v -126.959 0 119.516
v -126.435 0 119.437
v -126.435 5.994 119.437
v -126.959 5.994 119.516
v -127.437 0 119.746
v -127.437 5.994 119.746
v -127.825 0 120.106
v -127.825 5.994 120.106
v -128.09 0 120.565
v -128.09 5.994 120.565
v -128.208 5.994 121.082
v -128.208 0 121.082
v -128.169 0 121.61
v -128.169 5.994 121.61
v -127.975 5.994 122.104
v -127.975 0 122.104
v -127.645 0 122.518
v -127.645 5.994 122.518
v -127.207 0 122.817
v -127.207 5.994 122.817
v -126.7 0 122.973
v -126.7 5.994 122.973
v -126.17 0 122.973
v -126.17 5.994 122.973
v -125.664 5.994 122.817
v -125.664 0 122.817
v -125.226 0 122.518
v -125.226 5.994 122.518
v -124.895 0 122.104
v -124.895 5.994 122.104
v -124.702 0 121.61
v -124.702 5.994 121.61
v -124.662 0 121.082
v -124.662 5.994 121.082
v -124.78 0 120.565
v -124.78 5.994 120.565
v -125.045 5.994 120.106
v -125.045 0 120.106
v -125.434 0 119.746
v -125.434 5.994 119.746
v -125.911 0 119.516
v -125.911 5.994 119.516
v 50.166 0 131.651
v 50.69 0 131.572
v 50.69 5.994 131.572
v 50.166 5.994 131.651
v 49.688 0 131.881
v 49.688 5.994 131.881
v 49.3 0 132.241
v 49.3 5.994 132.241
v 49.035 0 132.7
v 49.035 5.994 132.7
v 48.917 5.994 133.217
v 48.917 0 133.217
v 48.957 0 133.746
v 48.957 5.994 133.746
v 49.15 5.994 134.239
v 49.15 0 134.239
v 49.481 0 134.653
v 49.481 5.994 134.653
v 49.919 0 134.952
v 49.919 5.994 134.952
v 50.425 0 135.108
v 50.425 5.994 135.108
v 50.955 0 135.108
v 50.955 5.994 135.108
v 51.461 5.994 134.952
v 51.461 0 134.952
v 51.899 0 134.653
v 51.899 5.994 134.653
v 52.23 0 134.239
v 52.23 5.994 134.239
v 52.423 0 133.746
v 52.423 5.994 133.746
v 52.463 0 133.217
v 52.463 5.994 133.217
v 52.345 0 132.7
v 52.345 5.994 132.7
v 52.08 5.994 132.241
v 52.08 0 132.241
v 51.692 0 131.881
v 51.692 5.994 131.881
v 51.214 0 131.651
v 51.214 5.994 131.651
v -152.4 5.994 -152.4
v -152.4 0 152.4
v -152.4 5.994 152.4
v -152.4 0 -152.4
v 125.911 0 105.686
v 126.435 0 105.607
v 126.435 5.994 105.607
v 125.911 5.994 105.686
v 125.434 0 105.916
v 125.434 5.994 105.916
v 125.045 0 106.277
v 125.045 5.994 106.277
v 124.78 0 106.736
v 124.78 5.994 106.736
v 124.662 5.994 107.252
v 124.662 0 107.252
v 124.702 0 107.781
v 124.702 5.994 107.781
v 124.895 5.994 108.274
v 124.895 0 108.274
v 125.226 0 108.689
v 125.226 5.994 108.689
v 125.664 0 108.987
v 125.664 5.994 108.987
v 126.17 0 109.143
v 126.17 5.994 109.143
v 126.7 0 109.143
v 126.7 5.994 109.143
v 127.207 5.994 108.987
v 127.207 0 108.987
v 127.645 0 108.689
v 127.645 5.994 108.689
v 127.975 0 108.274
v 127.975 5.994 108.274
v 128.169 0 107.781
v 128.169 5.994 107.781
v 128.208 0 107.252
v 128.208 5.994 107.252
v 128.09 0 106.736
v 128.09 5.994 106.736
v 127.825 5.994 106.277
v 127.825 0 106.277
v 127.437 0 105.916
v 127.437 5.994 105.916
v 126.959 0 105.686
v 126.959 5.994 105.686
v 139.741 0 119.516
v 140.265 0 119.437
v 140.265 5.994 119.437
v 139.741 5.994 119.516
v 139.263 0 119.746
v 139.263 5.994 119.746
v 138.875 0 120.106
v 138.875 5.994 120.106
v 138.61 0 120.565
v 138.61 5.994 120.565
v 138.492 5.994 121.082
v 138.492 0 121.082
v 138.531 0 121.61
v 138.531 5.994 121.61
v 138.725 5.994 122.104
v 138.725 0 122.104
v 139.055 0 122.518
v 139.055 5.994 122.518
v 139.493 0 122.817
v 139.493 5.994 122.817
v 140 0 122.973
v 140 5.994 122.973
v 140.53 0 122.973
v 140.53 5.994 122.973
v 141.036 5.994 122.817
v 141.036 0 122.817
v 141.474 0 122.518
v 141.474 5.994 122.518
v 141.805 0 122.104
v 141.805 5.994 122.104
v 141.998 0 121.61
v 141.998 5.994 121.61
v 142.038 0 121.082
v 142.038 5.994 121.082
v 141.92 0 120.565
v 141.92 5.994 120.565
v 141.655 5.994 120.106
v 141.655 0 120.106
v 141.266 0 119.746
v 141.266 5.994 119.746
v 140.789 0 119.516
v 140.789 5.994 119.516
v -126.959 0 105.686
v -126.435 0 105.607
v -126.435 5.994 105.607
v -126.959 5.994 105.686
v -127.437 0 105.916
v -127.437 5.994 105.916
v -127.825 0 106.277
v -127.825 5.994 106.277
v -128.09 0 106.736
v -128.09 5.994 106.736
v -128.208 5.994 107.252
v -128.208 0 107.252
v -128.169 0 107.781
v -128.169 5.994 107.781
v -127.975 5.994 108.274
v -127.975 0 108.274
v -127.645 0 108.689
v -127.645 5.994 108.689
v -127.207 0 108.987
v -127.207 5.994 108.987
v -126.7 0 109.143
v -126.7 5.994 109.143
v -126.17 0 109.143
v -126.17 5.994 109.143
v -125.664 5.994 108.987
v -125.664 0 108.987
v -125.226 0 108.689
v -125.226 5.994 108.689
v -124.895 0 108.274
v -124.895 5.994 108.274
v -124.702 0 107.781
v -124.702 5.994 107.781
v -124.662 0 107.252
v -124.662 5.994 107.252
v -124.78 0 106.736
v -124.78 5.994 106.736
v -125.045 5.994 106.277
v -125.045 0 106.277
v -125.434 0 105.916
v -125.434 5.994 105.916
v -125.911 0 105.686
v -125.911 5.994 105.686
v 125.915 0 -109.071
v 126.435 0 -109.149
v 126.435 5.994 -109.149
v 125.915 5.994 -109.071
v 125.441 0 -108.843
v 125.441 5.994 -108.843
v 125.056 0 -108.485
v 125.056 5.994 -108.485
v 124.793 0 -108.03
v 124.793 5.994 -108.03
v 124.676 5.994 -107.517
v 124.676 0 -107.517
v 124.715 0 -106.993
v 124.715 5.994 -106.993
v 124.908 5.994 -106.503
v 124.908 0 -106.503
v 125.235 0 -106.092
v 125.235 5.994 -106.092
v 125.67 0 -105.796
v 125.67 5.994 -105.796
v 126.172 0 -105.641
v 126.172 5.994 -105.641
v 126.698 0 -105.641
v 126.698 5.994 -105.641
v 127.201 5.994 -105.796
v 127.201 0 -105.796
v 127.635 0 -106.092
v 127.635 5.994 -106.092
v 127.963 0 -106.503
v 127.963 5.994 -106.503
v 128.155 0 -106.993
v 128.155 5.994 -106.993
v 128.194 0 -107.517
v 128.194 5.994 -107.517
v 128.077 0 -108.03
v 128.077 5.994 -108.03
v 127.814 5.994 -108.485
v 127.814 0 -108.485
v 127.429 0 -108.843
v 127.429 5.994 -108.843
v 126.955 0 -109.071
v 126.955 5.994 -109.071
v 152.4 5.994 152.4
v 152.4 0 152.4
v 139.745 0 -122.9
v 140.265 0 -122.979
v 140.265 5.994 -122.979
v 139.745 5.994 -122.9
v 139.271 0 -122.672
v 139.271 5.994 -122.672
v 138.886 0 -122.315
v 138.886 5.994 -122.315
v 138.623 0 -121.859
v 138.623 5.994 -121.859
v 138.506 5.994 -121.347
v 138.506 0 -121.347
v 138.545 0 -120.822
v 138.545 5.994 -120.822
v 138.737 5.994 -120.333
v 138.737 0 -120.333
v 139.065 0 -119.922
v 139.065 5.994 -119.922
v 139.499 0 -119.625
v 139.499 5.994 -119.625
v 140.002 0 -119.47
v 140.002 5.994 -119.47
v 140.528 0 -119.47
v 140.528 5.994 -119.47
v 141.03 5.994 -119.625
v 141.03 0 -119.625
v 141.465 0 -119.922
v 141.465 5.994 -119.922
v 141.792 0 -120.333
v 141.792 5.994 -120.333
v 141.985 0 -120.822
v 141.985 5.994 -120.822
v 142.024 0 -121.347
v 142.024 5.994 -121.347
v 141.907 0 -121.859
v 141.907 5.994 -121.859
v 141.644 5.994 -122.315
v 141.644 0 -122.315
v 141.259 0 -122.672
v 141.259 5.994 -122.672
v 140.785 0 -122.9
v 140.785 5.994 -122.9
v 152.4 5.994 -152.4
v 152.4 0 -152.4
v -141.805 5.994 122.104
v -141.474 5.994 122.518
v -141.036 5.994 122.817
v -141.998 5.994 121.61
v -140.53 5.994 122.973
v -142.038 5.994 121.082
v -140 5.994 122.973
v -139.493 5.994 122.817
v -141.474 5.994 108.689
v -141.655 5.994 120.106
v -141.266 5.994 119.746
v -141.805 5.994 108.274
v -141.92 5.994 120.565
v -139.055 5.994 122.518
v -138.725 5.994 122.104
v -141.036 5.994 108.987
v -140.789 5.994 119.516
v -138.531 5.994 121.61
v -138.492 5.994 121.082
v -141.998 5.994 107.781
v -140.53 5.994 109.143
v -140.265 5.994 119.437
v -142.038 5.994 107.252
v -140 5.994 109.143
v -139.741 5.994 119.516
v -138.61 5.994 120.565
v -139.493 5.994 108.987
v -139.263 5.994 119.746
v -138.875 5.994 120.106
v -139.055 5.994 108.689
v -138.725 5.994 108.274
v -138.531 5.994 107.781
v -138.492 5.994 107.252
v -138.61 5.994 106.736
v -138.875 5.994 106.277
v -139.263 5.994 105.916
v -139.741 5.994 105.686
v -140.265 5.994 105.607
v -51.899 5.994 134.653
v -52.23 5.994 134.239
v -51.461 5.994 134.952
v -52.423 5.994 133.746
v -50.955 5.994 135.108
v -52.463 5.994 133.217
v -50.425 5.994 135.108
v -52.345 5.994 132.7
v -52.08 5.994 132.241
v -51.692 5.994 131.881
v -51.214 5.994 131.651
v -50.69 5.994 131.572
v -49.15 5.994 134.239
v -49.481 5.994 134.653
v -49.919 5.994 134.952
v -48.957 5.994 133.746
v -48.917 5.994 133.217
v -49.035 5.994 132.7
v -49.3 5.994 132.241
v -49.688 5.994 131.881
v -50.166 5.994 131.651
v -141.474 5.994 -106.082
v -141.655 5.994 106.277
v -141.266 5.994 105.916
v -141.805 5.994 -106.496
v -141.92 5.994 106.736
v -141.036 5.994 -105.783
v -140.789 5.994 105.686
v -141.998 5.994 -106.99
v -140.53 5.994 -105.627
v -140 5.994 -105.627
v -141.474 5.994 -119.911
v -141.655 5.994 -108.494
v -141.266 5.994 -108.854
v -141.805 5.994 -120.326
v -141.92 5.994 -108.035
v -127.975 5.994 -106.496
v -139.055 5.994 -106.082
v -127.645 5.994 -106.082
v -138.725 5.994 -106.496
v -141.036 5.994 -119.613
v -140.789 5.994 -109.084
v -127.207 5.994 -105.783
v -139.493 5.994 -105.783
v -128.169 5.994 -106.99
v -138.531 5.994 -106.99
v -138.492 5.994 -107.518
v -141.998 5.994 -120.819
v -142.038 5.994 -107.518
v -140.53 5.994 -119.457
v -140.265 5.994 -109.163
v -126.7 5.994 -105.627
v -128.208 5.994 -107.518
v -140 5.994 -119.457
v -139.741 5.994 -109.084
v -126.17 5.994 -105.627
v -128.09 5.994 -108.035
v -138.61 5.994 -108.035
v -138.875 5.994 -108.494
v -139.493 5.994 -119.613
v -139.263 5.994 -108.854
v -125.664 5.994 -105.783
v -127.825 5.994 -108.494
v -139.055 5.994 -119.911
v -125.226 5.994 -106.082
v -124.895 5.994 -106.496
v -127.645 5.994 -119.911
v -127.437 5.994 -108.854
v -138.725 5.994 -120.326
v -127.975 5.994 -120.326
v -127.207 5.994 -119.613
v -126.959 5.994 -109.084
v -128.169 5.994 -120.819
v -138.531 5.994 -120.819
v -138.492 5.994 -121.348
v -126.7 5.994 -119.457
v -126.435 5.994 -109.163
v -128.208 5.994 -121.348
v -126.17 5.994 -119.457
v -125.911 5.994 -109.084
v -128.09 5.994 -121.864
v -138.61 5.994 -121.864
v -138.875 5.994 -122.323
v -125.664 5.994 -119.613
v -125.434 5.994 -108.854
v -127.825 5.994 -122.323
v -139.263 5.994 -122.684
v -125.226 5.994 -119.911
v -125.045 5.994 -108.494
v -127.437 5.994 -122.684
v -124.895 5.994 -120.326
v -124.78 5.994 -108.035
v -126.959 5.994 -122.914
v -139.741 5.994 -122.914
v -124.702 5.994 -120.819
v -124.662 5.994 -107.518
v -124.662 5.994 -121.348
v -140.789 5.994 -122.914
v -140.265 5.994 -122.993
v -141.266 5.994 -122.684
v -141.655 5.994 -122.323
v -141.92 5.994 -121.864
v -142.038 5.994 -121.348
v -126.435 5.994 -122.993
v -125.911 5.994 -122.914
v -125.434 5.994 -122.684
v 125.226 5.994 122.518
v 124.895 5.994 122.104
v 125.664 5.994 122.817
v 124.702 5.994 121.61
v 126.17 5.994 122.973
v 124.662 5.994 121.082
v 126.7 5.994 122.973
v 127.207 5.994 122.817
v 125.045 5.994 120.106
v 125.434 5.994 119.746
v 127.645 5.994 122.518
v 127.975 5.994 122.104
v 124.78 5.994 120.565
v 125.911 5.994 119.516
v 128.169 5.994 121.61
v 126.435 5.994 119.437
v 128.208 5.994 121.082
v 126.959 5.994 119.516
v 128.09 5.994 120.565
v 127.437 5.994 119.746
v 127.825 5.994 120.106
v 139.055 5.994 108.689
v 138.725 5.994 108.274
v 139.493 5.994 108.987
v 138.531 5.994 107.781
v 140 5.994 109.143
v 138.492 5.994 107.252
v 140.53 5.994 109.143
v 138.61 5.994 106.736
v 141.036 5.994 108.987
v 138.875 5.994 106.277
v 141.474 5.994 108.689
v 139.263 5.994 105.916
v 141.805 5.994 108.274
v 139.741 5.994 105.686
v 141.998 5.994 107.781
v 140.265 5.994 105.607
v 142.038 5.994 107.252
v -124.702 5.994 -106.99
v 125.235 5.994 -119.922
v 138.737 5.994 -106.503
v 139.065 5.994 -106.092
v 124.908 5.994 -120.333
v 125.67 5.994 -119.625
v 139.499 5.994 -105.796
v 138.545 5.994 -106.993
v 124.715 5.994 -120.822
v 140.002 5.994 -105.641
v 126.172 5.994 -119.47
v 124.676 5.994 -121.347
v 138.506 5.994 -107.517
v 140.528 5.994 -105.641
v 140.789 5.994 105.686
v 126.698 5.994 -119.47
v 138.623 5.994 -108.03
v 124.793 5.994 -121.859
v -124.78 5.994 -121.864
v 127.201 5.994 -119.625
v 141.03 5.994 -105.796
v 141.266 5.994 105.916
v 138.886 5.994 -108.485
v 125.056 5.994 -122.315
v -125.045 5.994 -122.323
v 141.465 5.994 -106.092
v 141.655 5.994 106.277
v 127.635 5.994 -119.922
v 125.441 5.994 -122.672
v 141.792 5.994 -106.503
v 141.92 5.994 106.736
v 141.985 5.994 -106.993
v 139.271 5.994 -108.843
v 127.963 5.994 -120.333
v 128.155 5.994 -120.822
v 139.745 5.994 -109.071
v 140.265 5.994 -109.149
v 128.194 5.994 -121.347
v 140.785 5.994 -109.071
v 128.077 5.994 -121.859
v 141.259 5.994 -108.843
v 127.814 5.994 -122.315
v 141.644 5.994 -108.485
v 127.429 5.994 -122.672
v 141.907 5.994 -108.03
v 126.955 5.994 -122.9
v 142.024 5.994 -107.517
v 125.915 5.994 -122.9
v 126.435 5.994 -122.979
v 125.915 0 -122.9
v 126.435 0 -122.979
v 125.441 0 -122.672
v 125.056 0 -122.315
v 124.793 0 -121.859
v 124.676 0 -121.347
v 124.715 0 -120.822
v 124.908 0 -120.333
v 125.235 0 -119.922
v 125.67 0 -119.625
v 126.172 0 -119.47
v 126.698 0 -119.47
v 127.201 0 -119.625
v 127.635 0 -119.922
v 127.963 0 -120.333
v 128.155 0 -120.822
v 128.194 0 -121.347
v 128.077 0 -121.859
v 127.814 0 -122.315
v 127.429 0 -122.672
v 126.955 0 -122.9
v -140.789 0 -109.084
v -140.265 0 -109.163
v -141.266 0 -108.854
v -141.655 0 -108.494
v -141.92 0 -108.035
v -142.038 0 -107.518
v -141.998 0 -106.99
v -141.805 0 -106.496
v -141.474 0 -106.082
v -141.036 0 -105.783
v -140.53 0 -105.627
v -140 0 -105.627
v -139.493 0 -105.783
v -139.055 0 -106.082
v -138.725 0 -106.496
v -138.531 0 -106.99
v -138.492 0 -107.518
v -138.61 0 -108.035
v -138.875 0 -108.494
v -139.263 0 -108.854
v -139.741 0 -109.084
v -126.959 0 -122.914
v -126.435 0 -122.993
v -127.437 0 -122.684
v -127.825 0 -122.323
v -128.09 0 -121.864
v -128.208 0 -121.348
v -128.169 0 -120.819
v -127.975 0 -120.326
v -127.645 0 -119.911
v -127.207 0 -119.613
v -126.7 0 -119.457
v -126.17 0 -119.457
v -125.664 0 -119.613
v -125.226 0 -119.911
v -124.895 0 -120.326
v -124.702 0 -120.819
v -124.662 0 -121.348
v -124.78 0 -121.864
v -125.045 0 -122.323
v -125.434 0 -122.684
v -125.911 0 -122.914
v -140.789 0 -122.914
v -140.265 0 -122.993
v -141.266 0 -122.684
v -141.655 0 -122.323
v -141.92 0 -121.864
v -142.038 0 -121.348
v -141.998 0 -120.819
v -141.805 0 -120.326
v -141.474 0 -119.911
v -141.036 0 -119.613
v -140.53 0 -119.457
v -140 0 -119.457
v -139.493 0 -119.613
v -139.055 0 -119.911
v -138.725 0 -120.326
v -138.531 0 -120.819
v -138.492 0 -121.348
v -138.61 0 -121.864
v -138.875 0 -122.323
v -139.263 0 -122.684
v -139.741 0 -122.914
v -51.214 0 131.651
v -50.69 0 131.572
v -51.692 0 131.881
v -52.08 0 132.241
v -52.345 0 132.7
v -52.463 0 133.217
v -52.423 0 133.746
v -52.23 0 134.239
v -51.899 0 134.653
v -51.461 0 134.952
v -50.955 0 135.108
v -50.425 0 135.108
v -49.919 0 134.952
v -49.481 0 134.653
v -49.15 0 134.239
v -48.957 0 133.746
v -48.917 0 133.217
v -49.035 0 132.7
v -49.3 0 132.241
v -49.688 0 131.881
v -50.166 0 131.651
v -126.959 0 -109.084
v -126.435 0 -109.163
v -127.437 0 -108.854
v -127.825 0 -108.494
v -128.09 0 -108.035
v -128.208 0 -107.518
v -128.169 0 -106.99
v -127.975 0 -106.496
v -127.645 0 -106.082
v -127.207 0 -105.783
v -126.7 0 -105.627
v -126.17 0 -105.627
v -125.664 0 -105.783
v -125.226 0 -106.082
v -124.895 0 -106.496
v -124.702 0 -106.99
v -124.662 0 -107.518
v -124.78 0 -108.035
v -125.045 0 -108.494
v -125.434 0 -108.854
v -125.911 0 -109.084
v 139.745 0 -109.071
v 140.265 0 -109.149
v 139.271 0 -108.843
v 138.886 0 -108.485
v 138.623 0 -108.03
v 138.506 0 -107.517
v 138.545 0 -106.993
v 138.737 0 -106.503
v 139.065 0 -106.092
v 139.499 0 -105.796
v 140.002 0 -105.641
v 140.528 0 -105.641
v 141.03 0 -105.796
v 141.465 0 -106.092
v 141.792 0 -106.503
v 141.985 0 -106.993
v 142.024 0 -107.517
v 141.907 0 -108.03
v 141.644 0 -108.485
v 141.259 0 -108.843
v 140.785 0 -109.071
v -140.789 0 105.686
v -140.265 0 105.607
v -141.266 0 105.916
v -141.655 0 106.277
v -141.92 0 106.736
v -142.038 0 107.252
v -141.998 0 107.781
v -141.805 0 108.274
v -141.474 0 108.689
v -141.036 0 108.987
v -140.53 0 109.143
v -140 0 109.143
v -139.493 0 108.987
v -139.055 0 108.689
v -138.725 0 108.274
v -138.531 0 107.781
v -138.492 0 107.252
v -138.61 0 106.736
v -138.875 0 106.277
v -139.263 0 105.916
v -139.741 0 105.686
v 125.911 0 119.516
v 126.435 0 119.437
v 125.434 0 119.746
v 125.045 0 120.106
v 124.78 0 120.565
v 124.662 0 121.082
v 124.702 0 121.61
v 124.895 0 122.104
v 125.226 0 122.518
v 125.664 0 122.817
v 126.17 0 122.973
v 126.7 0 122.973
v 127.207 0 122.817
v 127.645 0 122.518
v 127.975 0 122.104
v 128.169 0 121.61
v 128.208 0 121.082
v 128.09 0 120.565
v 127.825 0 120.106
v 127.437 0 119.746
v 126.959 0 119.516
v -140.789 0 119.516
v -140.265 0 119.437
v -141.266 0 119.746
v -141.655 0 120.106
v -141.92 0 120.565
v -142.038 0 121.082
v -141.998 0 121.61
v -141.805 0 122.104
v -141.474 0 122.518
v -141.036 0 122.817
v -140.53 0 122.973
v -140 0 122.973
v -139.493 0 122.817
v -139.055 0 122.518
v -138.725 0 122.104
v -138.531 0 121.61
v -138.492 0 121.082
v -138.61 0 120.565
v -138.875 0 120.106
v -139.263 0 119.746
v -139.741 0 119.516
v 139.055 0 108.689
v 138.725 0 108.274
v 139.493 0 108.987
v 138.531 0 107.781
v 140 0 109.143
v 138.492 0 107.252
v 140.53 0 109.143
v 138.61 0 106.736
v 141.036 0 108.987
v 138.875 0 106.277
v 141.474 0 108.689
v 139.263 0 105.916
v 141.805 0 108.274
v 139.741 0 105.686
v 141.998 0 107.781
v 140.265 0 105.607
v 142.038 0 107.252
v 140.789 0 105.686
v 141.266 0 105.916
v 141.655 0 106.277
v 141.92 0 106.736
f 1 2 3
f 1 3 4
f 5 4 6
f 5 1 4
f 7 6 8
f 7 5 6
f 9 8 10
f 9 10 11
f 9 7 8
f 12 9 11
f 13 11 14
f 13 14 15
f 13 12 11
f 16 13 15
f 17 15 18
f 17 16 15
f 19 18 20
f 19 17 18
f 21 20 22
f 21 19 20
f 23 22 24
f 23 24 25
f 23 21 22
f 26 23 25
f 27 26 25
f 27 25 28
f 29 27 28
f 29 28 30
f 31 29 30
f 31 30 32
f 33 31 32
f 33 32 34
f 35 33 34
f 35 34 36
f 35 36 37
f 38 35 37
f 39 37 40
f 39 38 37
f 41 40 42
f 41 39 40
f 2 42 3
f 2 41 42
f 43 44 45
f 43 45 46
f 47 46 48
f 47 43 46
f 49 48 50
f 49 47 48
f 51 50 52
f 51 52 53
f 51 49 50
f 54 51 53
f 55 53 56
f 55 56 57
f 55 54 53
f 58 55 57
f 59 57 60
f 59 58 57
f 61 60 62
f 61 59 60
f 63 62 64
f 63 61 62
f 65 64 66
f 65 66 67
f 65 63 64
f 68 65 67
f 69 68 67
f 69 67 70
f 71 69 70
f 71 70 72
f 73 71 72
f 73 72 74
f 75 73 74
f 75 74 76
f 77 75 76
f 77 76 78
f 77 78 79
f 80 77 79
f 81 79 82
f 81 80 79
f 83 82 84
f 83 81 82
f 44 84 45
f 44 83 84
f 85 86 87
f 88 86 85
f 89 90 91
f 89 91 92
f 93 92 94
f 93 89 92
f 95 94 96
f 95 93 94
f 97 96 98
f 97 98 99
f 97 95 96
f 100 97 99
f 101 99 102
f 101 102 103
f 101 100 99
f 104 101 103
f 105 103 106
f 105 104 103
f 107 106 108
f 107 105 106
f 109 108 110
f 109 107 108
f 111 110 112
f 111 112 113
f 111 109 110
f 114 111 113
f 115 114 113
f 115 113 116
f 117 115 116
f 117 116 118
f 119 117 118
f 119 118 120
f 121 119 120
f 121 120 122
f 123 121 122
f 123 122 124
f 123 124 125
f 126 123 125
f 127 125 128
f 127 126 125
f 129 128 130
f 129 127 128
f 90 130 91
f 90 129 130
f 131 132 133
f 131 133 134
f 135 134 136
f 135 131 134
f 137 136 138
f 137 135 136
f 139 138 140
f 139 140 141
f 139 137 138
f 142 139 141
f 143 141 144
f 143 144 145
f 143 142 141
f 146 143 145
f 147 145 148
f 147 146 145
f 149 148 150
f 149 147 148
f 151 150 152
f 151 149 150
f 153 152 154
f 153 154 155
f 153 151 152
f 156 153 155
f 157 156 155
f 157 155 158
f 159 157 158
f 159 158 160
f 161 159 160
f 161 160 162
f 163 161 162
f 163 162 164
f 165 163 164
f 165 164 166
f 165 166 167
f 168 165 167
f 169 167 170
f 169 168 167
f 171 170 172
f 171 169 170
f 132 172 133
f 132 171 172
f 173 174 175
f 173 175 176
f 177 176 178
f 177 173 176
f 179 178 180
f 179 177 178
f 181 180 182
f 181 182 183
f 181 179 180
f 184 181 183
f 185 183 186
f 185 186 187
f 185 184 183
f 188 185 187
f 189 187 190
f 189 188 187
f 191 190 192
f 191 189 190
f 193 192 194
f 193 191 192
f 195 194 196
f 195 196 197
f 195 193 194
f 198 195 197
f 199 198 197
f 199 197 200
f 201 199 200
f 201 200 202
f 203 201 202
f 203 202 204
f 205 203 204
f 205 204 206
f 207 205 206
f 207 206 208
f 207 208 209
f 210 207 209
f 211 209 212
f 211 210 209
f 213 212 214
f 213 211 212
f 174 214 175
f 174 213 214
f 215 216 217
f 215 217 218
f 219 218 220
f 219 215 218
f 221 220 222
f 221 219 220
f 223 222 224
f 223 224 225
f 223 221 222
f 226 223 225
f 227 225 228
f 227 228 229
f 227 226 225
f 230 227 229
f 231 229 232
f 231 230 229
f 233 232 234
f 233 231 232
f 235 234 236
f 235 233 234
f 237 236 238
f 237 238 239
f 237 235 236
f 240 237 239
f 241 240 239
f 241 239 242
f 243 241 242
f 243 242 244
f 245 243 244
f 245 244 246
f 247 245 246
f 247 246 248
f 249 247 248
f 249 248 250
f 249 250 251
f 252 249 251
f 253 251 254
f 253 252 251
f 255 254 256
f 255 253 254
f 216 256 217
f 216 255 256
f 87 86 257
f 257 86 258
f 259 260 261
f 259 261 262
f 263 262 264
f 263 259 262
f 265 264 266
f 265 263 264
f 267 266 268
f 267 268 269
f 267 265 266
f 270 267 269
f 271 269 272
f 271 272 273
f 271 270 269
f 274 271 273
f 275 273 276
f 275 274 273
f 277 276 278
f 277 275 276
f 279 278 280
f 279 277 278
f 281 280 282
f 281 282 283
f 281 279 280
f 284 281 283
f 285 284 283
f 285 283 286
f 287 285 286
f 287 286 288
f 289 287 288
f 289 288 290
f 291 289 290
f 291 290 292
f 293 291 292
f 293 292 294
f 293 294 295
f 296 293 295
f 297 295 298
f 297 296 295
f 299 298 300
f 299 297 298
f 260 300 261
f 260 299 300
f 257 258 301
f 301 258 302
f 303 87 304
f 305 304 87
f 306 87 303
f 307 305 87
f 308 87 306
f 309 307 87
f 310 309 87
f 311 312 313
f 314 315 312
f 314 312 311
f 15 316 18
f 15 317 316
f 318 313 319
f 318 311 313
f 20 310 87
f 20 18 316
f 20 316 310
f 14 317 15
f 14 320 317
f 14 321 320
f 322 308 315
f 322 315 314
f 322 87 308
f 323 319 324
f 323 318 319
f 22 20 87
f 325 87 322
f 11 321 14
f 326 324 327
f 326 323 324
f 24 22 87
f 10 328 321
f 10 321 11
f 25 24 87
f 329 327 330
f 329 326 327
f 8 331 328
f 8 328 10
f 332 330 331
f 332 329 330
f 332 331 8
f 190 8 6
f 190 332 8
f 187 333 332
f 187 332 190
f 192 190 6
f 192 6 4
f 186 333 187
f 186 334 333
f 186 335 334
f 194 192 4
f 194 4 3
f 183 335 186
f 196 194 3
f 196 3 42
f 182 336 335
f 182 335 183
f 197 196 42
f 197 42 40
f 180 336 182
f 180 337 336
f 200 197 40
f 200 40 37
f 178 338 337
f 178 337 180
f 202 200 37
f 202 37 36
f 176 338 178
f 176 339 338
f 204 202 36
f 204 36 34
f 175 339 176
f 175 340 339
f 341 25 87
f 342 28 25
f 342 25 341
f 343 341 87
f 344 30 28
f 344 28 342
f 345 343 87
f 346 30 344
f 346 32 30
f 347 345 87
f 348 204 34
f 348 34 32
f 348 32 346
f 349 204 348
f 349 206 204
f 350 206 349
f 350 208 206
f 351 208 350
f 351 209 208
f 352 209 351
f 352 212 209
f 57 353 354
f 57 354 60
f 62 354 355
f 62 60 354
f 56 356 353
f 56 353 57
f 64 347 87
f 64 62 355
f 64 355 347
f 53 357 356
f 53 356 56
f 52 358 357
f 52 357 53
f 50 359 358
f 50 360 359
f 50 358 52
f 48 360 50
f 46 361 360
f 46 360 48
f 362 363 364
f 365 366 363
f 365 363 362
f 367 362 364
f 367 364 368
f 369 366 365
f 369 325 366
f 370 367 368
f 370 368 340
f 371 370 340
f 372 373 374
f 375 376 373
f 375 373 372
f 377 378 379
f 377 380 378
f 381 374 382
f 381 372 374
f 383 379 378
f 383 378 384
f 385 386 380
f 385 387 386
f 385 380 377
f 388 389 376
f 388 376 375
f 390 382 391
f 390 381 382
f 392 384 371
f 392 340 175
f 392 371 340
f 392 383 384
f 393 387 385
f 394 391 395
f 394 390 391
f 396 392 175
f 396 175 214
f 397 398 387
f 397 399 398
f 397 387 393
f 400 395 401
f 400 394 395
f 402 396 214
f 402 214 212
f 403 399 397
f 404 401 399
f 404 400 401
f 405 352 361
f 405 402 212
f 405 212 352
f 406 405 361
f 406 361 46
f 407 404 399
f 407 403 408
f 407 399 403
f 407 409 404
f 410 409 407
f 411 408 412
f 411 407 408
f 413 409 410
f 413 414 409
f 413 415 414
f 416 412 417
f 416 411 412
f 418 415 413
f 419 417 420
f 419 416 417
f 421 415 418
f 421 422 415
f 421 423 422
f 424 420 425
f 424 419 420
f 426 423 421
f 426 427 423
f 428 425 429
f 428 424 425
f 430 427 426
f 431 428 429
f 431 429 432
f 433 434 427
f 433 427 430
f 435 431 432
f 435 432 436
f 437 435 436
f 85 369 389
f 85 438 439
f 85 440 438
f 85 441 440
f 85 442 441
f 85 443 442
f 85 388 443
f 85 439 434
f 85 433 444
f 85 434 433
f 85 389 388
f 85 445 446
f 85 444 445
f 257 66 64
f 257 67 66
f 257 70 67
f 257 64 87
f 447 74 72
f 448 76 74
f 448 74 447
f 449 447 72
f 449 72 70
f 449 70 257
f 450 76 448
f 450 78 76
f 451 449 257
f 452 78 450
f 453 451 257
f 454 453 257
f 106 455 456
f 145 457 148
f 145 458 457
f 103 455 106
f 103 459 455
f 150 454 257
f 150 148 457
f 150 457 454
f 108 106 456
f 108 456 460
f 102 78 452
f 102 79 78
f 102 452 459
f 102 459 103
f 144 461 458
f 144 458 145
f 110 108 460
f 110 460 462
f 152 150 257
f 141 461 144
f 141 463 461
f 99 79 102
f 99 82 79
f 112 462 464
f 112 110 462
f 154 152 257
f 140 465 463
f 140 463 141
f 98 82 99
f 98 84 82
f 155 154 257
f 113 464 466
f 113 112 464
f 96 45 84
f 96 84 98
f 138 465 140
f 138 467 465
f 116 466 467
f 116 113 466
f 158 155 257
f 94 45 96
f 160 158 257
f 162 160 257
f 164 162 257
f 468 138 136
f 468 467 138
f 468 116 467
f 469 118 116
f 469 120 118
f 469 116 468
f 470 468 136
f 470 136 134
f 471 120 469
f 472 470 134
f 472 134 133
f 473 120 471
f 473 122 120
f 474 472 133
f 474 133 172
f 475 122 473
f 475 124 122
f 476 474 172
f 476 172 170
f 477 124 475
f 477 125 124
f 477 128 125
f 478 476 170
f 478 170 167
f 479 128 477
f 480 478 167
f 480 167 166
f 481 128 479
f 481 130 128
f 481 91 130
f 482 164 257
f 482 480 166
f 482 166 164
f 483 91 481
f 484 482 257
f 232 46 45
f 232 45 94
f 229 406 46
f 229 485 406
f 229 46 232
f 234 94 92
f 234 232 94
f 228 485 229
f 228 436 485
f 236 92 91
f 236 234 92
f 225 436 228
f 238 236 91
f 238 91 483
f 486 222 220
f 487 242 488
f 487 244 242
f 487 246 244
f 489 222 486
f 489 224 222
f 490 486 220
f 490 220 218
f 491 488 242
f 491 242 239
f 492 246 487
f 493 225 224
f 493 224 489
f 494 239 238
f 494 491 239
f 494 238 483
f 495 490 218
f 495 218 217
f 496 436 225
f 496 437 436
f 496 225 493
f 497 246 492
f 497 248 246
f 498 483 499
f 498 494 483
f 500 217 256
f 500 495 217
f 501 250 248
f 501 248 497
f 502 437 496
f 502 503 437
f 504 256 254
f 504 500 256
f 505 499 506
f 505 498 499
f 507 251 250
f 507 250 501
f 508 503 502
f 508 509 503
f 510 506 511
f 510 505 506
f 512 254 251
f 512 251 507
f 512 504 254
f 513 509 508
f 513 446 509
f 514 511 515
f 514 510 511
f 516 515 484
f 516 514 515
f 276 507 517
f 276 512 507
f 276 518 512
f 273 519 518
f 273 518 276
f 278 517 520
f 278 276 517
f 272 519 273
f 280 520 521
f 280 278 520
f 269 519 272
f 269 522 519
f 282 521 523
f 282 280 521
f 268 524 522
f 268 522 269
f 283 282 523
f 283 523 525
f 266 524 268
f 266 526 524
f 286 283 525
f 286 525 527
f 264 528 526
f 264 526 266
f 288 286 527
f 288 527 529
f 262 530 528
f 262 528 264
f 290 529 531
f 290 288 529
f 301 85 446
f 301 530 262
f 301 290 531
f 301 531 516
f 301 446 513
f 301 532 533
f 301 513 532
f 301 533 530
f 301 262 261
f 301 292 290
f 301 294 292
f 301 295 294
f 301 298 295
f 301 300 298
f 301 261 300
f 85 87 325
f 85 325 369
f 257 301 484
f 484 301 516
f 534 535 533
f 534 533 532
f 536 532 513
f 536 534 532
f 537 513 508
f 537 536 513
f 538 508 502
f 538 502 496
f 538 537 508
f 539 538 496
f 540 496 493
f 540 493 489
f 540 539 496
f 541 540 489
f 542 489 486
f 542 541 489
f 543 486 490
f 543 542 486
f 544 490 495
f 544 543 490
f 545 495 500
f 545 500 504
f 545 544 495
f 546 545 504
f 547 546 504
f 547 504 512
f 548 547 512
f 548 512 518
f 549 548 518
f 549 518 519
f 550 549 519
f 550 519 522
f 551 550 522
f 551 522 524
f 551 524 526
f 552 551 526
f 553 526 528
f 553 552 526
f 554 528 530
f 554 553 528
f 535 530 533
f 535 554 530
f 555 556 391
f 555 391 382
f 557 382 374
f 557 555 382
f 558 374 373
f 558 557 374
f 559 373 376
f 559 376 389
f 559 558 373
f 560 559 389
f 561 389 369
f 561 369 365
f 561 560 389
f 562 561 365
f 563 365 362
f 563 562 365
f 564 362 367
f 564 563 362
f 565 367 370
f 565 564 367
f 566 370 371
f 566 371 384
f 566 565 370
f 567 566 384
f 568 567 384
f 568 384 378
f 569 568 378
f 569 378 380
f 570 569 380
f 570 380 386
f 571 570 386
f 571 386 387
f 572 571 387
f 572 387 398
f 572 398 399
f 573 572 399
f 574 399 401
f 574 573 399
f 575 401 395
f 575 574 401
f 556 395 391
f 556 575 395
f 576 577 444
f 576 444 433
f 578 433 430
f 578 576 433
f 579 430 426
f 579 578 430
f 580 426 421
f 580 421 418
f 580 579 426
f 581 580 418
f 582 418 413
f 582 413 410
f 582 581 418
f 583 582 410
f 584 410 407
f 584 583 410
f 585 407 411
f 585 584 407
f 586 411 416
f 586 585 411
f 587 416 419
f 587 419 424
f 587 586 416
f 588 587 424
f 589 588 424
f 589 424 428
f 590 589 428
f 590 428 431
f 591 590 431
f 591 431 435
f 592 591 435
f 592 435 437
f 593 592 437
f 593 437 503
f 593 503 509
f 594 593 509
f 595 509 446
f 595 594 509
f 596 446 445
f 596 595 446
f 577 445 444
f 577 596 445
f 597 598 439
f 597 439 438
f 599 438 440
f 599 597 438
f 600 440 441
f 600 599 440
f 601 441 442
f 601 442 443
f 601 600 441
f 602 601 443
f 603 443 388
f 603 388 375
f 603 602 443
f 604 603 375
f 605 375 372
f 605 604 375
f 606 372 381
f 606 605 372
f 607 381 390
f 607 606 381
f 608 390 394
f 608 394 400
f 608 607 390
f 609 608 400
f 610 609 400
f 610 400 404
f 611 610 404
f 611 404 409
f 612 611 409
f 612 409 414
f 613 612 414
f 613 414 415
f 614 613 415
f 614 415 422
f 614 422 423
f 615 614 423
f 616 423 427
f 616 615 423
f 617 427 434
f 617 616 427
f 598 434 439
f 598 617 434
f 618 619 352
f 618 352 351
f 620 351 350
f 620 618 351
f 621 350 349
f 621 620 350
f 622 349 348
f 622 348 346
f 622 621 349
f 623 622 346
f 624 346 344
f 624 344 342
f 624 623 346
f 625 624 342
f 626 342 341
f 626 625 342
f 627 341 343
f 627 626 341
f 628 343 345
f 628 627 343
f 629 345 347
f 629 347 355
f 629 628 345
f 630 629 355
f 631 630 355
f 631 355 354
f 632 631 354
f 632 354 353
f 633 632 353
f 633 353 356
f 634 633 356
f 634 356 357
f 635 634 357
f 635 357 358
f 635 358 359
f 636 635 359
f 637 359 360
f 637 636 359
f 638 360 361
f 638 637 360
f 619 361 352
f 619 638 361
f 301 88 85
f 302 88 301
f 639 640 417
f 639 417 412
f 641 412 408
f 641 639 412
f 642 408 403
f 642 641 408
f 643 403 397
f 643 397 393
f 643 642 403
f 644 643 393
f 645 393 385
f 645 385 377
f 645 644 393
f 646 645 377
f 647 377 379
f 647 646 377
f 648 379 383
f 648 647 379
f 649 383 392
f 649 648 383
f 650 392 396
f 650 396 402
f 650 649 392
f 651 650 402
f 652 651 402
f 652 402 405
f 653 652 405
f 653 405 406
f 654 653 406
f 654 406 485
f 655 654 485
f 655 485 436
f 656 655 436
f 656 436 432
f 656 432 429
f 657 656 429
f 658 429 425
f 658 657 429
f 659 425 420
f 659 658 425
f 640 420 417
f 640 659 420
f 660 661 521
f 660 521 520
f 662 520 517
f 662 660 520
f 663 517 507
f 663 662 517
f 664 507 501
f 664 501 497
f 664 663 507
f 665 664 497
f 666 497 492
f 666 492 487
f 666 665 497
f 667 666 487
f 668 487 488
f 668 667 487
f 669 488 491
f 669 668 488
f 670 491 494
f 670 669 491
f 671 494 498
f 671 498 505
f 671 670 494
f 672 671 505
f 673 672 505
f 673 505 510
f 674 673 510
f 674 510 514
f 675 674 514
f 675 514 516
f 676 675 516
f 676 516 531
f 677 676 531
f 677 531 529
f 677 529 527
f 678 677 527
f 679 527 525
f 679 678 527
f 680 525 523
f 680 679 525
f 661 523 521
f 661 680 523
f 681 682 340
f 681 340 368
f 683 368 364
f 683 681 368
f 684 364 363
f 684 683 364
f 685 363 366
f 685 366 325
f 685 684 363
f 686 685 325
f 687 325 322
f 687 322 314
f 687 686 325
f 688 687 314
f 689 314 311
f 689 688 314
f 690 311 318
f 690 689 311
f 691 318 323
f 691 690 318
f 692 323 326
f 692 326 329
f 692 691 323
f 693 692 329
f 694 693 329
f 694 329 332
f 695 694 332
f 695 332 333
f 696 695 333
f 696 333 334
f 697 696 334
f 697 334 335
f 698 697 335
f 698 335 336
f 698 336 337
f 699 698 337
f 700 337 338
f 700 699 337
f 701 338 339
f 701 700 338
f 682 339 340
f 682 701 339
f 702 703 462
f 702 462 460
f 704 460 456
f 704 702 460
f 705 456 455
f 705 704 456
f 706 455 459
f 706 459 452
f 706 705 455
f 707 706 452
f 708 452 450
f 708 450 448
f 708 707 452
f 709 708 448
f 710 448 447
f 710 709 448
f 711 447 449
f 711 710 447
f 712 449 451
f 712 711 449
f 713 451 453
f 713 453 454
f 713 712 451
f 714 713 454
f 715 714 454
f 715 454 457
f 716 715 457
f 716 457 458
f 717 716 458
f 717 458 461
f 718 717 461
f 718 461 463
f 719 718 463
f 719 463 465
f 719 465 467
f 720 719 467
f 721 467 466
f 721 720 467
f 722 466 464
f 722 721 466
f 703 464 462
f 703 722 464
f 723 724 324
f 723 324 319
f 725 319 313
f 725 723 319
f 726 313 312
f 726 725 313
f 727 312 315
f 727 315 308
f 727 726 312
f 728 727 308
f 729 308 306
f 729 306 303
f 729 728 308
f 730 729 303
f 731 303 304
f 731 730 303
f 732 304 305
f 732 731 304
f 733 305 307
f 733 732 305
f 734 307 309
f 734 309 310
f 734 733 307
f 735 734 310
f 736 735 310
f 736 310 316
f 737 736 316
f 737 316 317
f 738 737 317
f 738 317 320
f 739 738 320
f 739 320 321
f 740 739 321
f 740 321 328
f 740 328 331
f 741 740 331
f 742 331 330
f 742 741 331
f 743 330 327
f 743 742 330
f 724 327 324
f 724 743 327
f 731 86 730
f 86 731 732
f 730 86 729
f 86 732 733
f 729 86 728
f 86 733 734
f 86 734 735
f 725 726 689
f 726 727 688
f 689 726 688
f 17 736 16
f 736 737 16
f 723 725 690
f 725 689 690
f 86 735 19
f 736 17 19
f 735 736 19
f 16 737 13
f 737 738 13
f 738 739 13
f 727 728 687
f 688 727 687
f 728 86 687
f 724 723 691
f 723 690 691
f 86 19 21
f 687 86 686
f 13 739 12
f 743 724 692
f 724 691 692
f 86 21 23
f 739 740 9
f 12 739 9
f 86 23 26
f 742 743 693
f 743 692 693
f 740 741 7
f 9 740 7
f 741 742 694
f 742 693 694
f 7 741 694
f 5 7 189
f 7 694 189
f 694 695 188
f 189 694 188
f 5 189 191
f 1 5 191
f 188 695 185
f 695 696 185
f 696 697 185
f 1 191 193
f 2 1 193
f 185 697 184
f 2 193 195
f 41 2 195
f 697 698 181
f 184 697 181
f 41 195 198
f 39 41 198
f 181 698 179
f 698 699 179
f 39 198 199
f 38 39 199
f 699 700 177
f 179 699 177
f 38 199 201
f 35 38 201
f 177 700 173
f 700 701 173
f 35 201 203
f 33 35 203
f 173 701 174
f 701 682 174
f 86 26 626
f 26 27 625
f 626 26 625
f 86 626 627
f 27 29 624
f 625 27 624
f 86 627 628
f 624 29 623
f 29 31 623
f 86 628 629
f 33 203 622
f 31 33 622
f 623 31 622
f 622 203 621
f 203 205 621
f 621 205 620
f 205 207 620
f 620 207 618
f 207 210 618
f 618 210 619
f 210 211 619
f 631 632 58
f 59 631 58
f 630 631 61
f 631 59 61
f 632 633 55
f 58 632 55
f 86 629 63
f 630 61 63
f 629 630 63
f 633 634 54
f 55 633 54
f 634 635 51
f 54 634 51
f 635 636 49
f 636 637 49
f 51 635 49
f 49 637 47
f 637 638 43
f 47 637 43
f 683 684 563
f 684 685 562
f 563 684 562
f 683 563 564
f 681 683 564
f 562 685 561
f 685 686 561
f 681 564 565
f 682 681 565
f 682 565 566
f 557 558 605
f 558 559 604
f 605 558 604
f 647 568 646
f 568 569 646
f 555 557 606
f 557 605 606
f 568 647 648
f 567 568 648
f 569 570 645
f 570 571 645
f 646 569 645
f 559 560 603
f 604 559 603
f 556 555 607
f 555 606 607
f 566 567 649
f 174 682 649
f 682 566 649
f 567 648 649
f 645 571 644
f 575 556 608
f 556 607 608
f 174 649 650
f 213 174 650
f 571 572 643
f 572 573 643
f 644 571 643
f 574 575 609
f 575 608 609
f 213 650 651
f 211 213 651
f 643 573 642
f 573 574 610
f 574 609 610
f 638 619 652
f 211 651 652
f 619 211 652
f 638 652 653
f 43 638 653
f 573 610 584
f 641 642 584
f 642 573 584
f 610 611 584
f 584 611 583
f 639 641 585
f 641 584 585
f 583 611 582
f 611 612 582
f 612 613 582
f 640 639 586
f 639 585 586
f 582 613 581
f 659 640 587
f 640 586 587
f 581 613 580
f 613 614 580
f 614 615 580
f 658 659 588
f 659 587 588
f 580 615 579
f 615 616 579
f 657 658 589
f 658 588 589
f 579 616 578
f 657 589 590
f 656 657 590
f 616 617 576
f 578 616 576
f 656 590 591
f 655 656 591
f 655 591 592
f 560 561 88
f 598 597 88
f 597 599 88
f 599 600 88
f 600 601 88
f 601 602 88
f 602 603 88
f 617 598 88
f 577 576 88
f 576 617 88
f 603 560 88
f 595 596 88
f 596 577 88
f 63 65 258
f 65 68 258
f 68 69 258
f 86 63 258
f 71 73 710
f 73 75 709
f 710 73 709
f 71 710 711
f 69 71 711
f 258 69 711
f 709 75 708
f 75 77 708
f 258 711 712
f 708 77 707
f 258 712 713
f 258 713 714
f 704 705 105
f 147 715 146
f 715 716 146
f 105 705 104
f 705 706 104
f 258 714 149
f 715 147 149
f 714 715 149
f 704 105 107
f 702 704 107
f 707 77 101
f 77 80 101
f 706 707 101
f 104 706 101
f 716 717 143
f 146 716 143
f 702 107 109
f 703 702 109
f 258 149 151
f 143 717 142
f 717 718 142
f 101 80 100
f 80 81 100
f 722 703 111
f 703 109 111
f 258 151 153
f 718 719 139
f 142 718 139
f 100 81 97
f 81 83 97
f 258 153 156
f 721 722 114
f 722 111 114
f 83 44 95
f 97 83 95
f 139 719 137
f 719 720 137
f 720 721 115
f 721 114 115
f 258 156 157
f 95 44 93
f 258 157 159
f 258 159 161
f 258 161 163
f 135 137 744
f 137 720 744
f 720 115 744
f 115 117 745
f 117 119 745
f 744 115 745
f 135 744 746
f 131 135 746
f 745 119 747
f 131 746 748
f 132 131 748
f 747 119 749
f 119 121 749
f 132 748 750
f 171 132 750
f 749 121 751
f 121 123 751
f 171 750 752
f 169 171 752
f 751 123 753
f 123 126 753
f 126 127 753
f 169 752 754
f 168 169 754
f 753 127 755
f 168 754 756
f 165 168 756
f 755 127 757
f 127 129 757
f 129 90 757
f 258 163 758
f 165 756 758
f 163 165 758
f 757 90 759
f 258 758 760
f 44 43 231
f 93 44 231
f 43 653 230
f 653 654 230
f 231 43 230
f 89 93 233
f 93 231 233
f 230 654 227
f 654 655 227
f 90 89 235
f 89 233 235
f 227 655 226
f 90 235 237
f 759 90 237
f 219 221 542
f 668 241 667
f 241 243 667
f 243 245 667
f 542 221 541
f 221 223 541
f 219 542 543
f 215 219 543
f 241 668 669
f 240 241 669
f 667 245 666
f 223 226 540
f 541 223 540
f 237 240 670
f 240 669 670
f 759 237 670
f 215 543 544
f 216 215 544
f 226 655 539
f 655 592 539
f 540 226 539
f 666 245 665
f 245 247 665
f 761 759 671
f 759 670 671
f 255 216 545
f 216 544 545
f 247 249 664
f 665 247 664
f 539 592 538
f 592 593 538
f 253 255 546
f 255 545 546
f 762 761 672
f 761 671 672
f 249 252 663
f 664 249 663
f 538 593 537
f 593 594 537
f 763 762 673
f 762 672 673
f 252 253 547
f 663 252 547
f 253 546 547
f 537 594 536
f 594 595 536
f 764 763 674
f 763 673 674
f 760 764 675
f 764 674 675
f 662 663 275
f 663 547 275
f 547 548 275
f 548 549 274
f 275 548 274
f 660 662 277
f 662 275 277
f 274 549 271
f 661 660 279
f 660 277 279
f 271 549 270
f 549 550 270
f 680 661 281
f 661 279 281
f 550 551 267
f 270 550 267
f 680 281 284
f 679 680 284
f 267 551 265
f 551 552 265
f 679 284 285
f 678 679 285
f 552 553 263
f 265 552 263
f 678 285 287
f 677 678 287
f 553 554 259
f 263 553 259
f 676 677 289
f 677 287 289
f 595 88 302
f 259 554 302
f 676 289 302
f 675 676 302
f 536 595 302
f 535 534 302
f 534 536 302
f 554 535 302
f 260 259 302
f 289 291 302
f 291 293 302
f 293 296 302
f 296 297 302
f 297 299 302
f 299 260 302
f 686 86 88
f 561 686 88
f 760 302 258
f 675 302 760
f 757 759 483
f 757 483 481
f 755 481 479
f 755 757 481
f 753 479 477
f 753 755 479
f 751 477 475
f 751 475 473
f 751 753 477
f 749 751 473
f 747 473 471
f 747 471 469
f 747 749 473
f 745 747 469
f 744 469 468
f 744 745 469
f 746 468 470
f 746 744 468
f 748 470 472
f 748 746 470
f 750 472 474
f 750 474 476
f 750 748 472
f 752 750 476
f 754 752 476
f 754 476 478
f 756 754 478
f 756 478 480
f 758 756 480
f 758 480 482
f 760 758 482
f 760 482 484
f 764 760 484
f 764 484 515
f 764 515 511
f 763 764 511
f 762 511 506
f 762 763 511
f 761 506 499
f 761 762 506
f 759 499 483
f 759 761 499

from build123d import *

# Parameters (mm, degrees)
SKETCH1_W           = 304.8
SKETCH1_H           = 304.8
SKETCH1_R           = 1.778
SKETCH1_R_2         = 1.764026957
BOSS_EXTRUDE1_DEPTH = 5.9944


with BuildPart() as part:
    # Sketch1 → Boss-Extrude1 (new body)
    with BuildSketch(Plane(origin=(0, 0, 0), x_dir=(1, 0, 0), z_dir=(0, 1, 0))):
        Rectangle(SKETCH1_W, SKETCH1_H)
        with Locations(Location((-140.264797213, 121.214797213, 0), (0, 0, 90))):
            Circle(SKETCH1_R, mode=Mode.SUBTRACT)
        with Locations(Location((-140.264797213, 107.385202787, 0), (0, 0, 90))):
            Circle(SKETCH1_R, mode=Mode.SUBTRACT)
        with Locations(Location((-126.435202787, 107.385202787, 0), (0, 0, 90))):
            Circle(SKETCH1_R, mode=Mode.SUBTRACT)
        with Locations(Location((-126.435202787, 121.214797213, 0), (0, 0, 90))):
            Circle(SKETCH1_R, mode=Mode.SUBTRACT)
        with Locations(Location((-140.264797213, -121.214797213, 0), (0, 0, 90))):
            Circle(SKETCH1_R, mode=Mode.SUBTRACT)
        with Locations(Location((-126.435202787, -121.214797213, 0), (0, 0, 90))):
            Circle(SKETCH1_R, mode=Mode.SUBTRACT)
        with Locations(Location((-126.435202787, -107.385202787, 0), (0, 0, 90))):
            Circle(SKETCH1_R, mode=Mode.SUBTRACT)
        with Locations(Location((-140.264797213, -107.385202787, 0), (0, 0, 90))):
            Circle(SKETCH1_R, mode=Mode.SUBTRACT)
        with Locations(Location((126.435202787, 121.214797213, 0), (0, 0, 90))):
            Circle(SKETCH1_R_2, mode=Mode.SUBTRACT)
        with Locations(Location((140.264797213, 121.214797213, 0), (0, 0, 90))):
            Circle(SKETCH1_R_2, mode=Mode.SUBTRACT)
        with Locations(Location((140.264797213, 107.385202787, 0), (0, 0, 90))):
            Circle(SKETCH1_R_2, mode=Mode.SUBTRACT)
        with Locations(Location((126.435202787, 107.385202787, 0), (0, 0, 90))):
            Circle(SKETCH1_R_2, mode=Mode.SUBTRACT)
        with Locations(Location((-50.689968624, -133.35, 0), (0, 0, 90))):
            Circle(SKETCH1_R, mode=Mode.SUBTRACT)
        with Locations(Location((126.435202787, -107.385202787, 0), (0, 0, 90))):
            Circle(SKETCH1_R, mode=Mode.SUBTRACT)
        with Locations(Location((126.435202787, -121.214797213, 0), (0, 0, 90))):
            Circle(SKETCH1_R, mode=Mode.SUBTRACT)
        with Locations(Location((140.264797213, -121.214797213, 0), (0, 0, 90))):
            Circle(SKETCH1_R, mode=Mode.SUBTRACT)
        with Locations(Location((140.264797213, -107.385202787, 0), (0, 0, 90))):
            Circle(SKETCH1_R, mode=Mode.SUBTRACT)
        with Locations(Location((50.689968624, -133.35, 0), (0, 0, 90))):
            Circle(SKETCH1_R, mode=Mode.SUBTRACT)
    extrude(amount=BOSS_EXTRUDE1_DEPTH)


solid = part.part
